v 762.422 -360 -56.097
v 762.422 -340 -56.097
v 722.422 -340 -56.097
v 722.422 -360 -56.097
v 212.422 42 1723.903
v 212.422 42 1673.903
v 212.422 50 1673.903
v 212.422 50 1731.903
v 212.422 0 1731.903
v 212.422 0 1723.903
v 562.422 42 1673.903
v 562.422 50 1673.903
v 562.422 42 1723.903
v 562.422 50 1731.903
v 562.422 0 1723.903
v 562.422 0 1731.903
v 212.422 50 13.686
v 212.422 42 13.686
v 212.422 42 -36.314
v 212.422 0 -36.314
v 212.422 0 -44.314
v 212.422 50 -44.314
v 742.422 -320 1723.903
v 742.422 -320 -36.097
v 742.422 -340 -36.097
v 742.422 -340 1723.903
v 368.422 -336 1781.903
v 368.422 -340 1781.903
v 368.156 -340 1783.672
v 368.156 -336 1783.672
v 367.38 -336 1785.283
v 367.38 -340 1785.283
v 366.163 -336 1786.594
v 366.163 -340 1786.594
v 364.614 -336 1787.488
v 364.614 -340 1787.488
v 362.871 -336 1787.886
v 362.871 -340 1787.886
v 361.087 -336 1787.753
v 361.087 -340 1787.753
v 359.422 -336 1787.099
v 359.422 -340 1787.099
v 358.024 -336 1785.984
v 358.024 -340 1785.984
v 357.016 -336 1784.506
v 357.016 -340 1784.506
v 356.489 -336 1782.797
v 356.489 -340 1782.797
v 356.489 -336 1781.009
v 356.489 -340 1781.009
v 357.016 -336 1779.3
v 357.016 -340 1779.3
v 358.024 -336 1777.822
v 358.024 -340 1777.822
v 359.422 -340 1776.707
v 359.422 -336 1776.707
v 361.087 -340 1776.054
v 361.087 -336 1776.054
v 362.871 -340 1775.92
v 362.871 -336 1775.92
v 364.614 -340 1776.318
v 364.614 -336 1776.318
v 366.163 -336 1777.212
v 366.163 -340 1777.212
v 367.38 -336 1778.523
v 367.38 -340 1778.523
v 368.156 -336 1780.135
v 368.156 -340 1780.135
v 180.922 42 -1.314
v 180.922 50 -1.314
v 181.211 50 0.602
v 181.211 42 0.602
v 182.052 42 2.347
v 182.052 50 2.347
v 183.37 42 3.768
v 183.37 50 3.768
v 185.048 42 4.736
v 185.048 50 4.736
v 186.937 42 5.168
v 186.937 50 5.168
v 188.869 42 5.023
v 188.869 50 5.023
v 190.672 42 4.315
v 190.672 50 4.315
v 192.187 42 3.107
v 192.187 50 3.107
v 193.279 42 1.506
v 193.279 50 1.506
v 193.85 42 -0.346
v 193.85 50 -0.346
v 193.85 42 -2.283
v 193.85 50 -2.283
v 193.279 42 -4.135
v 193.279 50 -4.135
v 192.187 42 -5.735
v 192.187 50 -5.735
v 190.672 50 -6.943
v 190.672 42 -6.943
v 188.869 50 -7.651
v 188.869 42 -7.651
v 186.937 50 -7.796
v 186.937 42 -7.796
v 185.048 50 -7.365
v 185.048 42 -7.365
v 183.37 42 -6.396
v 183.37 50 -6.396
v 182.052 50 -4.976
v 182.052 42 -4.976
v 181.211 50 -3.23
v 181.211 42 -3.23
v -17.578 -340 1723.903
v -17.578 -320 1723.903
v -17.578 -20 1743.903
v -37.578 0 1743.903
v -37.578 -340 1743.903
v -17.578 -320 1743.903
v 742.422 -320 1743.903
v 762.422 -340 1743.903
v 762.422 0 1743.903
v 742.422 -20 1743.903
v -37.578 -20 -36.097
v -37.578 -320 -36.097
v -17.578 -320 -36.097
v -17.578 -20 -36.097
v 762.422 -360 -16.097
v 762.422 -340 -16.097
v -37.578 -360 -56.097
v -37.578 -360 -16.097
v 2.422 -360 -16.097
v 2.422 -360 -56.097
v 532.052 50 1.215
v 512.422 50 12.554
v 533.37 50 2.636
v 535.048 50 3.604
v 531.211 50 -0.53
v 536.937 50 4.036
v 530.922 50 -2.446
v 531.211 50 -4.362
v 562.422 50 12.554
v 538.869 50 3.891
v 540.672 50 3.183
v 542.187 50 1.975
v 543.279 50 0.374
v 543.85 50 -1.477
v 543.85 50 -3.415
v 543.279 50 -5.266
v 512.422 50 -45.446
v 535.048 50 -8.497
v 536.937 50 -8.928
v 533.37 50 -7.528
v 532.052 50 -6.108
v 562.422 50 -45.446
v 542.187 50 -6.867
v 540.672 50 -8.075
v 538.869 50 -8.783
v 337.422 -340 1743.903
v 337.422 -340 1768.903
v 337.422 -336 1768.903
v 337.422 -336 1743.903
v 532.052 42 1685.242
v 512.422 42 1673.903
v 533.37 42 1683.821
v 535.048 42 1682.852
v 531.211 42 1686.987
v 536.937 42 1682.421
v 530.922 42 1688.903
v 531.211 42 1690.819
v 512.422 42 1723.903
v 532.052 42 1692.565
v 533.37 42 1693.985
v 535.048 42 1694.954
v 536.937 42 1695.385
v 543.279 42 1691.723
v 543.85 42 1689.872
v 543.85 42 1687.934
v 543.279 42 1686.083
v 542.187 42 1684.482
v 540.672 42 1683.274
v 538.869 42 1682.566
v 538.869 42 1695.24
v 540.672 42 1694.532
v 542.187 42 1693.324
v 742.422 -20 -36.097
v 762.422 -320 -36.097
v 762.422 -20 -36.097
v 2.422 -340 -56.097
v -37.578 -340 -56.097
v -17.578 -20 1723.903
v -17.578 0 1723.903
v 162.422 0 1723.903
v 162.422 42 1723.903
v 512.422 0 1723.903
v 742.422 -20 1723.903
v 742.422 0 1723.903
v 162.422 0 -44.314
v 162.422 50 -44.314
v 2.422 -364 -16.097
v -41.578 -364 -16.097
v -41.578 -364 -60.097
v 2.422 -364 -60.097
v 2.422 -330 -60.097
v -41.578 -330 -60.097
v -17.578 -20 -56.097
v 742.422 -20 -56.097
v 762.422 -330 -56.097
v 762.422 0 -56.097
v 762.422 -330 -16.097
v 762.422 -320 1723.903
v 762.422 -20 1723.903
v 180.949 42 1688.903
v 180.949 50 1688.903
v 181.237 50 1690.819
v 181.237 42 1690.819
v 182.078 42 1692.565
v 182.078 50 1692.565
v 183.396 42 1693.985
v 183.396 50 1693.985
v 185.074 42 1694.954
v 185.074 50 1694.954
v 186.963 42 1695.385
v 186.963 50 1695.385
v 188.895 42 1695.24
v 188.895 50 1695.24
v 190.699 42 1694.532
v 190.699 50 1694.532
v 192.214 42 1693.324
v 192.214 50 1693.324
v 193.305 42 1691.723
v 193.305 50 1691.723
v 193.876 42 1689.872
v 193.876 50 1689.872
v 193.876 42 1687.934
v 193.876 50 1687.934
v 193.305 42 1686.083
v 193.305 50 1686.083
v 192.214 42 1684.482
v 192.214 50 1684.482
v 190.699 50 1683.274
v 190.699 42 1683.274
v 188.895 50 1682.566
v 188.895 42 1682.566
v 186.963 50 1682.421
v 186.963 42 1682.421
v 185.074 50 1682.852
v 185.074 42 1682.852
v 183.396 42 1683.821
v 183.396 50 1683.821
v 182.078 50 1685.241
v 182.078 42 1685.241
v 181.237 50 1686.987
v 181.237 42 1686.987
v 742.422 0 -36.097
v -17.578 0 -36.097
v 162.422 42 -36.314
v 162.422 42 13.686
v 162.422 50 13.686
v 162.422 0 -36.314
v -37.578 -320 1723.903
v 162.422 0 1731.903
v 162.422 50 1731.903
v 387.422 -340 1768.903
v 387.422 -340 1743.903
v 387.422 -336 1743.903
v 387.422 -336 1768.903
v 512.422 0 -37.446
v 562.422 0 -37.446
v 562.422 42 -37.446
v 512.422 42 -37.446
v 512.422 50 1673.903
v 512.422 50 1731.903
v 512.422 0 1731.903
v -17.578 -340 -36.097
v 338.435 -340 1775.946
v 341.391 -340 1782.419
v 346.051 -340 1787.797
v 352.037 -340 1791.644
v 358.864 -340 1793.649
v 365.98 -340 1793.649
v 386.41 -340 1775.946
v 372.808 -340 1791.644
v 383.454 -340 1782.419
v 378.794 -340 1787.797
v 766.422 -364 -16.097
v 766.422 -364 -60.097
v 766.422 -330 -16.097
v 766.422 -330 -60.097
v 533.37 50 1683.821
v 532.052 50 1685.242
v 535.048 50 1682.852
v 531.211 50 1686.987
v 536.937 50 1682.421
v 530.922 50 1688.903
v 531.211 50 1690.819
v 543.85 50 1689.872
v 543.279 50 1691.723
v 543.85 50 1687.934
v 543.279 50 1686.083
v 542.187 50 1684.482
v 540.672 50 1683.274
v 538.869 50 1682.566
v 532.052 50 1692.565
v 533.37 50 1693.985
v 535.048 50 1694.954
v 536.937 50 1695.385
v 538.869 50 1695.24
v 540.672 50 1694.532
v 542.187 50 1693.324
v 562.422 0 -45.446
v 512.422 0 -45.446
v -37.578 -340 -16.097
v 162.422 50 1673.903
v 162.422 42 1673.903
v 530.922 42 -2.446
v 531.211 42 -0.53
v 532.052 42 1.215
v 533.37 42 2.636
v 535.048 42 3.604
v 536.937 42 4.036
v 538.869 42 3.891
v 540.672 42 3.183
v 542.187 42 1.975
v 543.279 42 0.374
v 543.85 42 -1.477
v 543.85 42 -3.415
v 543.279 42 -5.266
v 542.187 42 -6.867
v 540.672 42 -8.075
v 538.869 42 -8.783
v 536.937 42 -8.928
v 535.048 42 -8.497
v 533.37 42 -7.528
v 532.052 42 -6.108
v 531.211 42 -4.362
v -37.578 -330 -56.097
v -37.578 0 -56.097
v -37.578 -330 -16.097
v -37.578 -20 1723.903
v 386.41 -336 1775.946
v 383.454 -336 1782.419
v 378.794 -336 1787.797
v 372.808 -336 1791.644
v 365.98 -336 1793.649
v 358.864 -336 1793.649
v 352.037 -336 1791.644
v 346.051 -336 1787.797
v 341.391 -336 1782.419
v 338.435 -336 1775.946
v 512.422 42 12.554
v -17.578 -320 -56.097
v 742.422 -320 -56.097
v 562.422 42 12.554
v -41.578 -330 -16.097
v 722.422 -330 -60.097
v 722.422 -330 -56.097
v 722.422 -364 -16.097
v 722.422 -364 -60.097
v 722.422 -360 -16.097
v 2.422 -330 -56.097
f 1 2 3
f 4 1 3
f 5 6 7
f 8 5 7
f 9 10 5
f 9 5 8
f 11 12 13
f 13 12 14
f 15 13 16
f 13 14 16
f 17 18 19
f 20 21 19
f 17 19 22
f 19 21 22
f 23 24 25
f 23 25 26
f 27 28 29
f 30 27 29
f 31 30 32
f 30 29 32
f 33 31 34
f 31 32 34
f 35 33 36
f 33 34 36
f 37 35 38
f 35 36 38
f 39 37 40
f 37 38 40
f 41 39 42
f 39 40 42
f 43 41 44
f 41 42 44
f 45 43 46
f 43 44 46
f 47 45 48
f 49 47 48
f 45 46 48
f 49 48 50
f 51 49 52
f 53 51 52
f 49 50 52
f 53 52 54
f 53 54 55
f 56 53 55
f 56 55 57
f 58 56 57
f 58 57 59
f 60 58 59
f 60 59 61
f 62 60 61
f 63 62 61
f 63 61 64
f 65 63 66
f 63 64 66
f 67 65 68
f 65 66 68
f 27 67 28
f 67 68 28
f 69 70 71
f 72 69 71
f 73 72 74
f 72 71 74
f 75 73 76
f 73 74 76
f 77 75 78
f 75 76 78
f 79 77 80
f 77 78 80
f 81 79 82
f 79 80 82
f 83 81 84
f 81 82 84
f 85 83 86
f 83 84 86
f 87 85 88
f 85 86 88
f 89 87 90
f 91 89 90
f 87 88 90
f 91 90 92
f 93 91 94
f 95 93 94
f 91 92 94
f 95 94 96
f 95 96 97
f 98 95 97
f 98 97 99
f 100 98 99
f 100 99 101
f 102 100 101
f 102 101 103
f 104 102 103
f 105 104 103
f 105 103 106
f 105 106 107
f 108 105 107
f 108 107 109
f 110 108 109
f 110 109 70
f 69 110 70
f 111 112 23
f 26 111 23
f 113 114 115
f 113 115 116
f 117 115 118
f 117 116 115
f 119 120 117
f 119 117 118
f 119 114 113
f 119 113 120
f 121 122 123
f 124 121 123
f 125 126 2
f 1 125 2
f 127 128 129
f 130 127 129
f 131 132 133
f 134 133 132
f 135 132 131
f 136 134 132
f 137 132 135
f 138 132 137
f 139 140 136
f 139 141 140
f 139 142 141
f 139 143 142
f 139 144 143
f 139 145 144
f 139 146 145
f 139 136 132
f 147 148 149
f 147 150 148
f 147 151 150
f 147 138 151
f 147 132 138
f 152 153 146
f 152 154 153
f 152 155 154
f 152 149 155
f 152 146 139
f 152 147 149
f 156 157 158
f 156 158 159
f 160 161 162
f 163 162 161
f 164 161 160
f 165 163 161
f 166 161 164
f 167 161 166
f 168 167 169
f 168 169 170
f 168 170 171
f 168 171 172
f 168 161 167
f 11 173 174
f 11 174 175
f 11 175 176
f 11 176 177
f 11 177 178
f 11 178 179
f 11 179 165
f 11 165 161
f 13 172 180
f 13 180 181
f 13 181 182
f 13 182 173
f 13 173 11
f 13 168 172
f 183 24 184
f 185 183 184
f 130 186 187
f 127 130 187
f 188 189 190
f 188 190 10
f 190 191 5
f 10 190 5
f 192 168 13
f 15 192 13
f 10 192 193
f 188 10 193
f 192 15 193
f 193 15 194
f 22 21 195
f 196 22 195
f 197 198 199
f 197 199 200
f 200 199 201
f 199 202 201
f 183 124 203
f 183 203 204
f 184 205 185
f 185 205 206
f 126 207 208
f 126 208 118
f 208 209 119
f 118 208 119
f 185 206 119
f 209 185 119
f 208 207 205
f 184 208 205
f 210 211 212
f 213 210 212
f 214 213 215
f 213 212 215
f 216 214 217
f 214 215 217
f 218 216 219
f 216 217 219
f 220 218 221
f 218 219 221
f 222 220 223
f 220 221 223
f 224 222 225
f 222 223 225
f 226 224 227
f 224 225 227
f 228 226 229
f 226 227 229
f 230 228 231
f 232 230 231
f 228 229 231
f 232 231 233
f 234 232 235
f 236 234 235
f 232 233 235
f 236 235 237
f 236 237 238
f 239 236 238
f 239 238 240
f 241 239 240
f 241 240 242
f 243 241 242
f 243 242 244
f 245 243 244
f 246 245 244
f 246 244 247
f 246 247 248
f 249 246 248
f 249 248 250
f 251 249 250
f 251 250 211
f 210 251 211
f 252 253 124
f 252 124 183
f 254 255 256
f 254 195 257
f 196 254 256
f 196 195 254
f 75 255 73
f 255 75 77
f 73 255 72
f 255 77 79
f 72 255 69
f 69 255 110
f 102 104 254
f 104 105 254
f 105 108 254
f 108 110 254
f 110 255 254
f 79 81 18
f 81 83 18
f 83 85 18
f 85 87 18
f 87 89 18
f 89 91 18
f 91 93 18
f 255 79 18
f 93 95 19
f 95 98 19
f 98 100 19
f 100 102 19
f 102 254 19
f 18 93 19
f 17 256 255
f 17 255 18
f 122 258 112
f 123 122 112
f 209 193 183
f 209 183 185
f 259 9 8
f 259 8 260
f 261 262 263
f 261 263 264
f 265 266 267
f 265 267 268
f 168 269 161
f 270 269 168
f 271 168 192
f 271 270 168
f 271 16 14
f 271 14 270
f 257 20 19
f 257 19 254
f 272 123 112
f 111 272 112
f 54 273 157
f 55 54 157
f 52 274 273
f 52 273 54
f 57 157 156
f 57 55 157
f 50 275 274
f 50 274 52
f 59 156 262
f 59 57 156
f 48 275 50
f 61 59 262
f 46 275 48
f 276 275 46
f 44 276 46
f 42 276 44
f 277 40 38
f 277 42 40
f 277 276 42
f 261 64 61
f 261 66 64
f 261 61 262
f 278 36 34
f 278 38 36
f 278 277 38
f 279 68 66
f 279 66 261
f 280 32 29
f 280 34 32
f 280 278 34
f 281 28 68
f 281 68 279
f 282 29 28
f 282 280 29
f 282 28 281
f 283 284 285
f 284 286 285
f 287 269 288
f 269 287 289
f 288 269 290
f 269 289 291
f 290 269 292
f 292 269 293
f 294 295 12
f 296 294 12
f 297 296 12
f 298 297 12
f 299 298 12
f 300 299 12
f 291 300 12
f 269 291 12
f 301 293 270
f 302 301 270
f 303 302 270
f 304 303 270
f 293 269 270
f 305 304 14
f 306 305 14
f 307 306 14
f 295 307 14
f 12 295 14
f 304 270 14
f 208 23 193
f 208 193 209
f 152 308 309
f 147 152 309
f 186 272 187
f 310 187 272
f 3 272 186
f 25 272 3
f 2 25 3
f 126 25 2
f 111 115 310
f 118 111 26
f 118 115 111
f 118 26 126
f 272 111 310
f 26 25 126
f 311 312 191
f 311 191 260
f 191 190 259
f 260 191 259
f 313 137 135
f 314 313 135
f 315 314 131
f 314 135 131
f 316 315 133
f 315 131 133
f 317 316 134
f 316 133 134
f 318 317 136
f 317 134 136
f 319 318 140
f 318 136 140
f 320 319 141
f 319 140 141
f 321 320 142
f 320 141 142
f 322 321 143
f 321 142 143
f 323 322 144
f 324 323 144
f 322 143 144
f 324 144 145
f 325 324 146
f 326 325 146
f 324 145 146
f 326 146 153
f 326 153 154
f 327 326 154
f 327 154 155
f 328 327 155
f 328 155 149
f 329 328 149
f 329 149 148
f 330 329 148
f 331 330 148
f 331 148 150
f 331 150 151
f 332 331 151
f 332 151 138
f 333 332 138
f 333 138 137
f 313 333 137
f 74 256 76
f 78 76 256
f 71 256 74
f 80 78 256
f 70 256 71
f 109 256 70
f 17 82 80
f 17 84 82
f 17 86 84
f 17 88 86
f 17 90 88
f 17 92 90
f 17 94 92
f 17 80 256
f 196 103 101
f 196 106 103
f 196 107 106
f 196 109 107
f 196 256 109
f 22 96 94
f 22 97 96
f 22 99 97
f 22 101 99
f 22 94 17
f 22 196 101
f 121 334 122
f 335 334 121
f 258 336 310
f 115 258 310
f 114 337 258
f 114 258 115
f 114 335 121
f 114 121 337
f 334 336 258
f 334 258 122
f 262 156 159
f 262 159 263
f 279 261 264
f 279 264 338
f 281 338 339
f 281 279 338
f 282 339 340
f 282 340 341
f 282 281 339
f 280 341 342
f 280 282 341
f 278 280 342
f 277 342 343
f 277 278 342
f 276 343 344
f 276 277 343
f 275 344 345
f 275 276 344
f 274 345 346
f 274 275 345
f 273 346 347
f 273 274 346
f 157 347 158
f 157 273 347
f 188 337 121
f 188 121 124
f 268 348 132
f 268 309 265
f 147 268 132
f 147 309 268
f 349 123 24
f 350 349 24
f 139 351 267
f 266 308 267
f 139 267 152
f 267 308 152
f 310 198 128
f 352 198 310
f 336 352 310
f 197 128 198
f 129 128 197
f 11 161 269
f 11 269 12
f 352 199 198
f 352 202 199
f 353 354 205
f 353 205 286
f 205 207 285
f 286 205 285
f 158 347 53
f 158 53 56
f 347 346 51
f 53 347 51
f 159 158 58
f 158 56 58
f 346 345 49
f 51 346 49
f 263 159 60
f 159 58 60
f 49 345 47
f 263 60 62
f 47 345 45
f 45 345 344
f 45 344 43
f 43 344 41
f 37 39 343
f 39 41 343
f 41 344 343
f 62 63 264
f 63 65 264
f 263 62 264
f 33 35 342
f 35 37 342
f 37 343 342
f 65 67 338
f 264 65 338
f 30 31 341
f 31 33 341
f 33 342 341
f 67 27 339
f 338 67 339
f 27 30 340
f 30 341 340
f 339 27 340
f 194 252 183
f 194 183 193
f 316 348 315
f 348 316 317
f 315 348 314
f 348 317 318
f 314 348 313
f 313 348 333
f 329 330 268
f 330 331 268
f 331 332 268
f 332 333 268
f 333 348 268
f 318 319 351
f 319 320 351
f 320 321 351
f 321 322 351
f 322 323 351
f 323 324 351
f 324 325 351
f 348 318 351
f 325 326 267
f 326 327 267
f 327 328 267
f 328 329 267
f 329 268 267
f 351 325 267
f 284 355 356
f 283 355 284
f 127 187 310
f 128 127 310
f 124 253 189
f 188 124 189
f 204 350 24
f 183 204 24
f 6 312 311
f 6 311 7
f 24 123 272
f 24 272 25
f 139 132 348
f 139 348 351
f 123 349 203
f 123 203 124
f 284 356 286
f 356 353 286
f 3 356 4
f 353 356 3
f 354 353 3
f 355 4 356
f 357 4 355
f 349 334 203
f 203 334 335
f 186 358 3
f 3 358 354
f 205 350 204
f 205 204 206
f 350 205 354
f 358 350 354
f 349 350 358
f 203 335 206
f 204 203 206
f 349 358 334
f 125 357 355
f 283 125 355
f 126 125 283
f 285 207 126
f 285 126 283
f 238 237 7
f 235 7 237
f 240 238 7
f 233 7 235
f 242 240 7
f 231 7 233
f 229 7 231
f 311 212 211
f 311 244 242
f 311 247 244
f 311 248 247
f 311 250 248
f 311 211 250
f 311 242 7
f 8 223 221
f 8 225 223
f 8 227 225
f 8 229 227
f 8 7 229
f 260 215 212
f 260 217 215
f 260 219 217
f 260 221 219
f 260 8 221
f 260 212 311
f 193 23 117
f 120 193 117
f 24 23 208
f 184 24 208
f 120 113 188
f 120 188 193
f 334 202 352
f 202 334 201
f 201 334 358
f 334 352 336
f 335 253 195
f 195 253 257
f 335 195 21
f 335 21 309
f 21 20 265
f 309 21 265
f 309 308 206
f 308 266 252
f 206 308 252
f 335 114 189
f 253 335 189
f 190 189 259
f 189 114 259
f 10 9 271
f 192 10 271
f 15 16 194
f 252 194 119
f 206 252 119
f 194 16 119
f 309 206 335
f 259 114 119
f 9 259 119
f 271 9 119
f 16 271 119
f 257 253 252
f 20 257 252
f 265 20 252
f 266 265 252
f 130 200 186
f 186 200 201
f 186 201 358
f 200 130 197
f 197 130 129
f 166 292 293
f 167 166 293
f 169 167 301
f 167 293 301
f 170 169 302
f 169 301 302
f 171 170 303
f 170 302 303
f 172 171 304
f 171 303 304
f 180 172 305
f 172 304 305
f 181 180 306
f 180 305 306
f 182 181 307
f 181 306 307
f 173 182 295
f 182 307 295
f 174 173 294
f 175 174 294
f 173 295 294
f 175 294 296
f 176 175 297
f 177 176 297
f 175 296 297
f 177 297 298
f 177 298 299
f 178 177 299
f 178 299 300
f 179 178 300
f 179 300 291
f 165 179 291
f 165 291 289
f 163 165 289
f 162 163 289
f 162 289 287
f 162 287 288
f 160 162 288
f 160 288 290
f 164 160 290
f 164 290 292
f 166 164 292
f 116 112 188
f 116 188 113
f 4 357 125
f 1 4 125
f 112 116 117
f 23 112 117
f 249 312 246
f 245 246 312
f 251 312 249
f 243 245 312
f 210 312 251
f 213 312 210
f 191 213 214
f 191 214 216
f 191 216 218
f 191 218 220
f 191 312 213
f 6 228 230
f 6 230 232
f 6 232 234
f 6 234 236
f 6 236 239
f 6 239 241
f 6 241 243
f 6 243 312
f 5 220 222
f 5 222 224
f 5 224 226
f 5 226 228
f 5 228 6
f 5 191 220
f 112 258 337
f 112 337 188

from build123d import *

# Parameters (mm, degrees)
F0_W      = 800
F0_H      = 1800
F0_W_2    = 760
F0_H_2    = 1760
F1_DEPTH  = 20
F2_W      = 20
F2_H      = 20
F3_DEPTH  = 300
F4_W      = 800
F4_H      = 1800
F4_W_2    = 760
F4_H_2    = 1760
F5_DEPTH  = 20
F6_W      = 50
F6_H      = 8
F7_DEPTH  = 50
F8_W      = 50
F8_H      = 8
F9_DEPTH  = 50
F10_W     = 50
F10_H     = 8
F11_DEPTH = 50
F12_W     = 50
F12_H     = 8
F13_DEPTH = 50
F14_R     = 6.5
F15_DEPTH = 25
F16_R     = 6.5
F17_DEPTH = 25
F18_R     = 6.5
F19_DEPTH = 25
F20_R     = 6.5
F21_DEPTH = 25
F22_R     = 6
F23_DEPTH = 4
F25_DEPTH = 10
F26_DEPTH = 20
F27_W     = 44
F27_H     = 44
F28_DEPTH = 4
F30_DEPTH = 10
F31_DEPTH = 20
F32_W     = 44
F32_H     = 44
F33_DEPTH = 4


with BuildPart() as f1:
    # F0 (on Front) → F1 (new body)
    with BuildSketch(Plane.XZ):
        with Locations((362.4222703278, 843.9030997455)):
            Rectangle(F0_W, F0_H)
        with Locations((362.4222703278, 843.9030997455)):
            Rectangle(F0_W_2, F0_H_2, mode=Mode.SUBTRACT)
    extrude(amount=F1_DEPTH)

    # F2 (on face) → F3 (join)
    with BuildSketch(Plane.XZ.offset(20)):
        with Locations((752.4222703278, 1733.9030997455)):
            Rectangle(F2_W, F2_H)
        with Locations((752.4222703278, -46.0969002545)):
            Rectangle(F2_W, F2_H)
        with Locations((-27.5777296722, -46.0969002545)):
            Rectangle(F2_W, F2_H)
        with Locations((-27.5777296722, 1733.9030997455)):
            Rectangle(F2_W, F2_H)
    extrude(amount=F3_DEPTH)

    # F4 (on face) → F5 (join)
    with BuildSketch(Plane.XZ.offset(320)):
        with Locations((362.4222703278, 843.9030997455)):
            Rectangle(F4_W, F4_H)
        with Locations((362.4222703278, 843.9030997455)):
            Rectangle(F4_W_2, F4_H_2, mode=Mode.SUBTRACT)
    extrude(amount=F5_DEPTH)

    # F6 (on face) → F7 (join)
    with BuildSketch(Plane(origin=(0, 0, 0), x_dir=(-1, 0, 0), z_dir=(0, 1, 0))):
        with Locations((-537.4222703278, 1727.9030997455)):
            Rectangle(F6_W, F6_H)
        with Locations((-187.4222703278, 1727.9030997455)):
            Rectangle(F6_W, F6_H)
        with Locations((-537.4222703278, -41.4462356865)):
            Rectangle(F6_W, F6_H)
        with Locations((-187.4222703278, -40.3143025041)):
            Rectangle(F6_W, F6_H)
    extrude(amount=F7_DEPTH)

    # F8 (on face) → F9 (join)
    with BuildSketch(Plane(origin=(0, 0, 1723.9030997455), x_dir=(1, 0, 0), z_dir=(0, 0, -1))):
        with Locations((537.4222703278, -46)):
            Rectangle(F8_W, F8_H)
        with Locations((187.4222703278, -46)):
            Rectangle(F8_W, F8_H)
    extrude(amount=F9_DEPTH)

    # F10 (on face) → F11 (join)
    with BuildSketch(Plane.XY.offset(-36.3143025041)):
        with Locations((187.4222703278, 46)):
            Rectangle(F10_W, F10_H)
    extrude(amount=F11_DEPTH)

    # F12 (on face) → F13 (join)
    with BuildSketch(Plane.XY.offset(-37.4462356865)):
        with Locations((537.4222703278, 46)):
            Rectangle(F12_W, F12_H)
    extrude(amount=F13_DEPTH)

    # F14 (on face) → F15 (cut)
    with BuildSketch(Plane(origin=(0, 50, 0), x_dir=(-1, 0, 0), z_dir=(0, 1, 0))):
        with Locations((-187.4222703278, -1.3143025041)):
            Circle(F14_R)
    extrude(amount=-F15_DEPTH, mode=Mode.SUBTRACT)

    # F16 (on face) → F17 (cut)
    with BuildSketch(Plane(origin=(0, 50, 0), x_dir=(-1, 0, 0), z_dir=(0, 1, 0))):
        with Locations((-537.4222703278, -2.4462356865)):
            Circle(F16_R)
    extrude(amount=-F17_DEPTH, mode=Mode.SUBTRACT)

    # F18 (on face) → F19 (cut)
    with BuildSketch(Plane(origin=(0, 50, 0), x_dir=(-1, 0, 0), z_dir=(0, 1, 0))):
        with Locations((-187.4486728463, 1688.9030765091)):
            Circle(F18_R)
    extrude(amount=-F19_DEPTH, mode=Mode.SUBTRACT)

    # F20 (on face) → F21 (cut)
    with BuildSketch(Plane(origin=(0, 50, 0), x_dir=(-1, 0, 0), z_dir=(0, 1, 0))):
        with Locations((-537.4222703278, 1688.9030997455)):
            Circle(F20_R)
    extrude(amount=-F21_DEPTH, mode=Mode.SUBTRACT)

    # F24 (on face) → F25 (join)
    with BuildSketch(Plane.XZ.offset(340)):
        Polygon((2.4222703278, -56.0969002545), (-37.5777296722, -56.0969002545), (-37.5777296722, -16.0969002545), (-41.5777296722, -16.0969002545), (-41.5777296722, -60.0969002545), (2.4222703278, -60.0969002545), align=None)
    extrude(amount=-F25_DEPTH)

    # F24 (on face) → F26 (join)
    with BuildSketch(Plane.XZ.offset(340)):
        Polygon((2.4222703278, -56.0969002545), (-37.5777296722, -56.0969002545), (-37.5777296722, -16.0969002545), (-41.5777296722, -16.0969002545), (-41.5777296722, -60.0969002545), (2.4222703278, -60.0969002545), align=None)
    extrude(amount=F26_DEPTH)

    # F27 (on face) → F28 (join)
    with BuildSketch(Plane.XZ.offset(360)):
        with Locations((-19.5777296722, -38.0969002545)):
            Rectangle(F27_W, F27_H)
    extrude(amount=F28_DEPTH)

    # F29 (on face) → F30 (join)
    with BuildSketch(Plane.XZ.offset(340)):
        Polygon((762.4222703278, -16.0969002545), (762.4222703278, -56.0969002545), (722.4222703278, -56.0969002545), (722.4222703278, -60.0969002545), (766.4222703278, -60.0969002545), (766.4222703278, -16.0969002545), align=None)
    extrude(amount=-F30_DEPTH)

    # F29 (on face) → F31 (join)
    with BuildSketch(Plane.XZ.offset(340)):
        Polygon((762.4222703278, -16.0969002545), (762.4222703278, -56.0969002545), (722.4222703278, -56.0969002545), (722.4222703278, -60.0969002545), (766.4222703278, -60.0969002545), (766.4222703278, -16.0969002545), align=None)
    extrude(amount=F31_DEPTH)

    # F32 (on face) → F33 (join)
    with BuildSketch(Plane.XZ.offset(360)):
        with Locations((744.4222703278, -38.0969002545)):
            Rectangle(F32_W, F32_H)
    extrude(amount=F33_DEPTH)


with BuildPart() as f23:
    # F22 (on face) → F23 (new body)
    with BuildSketch(Plane.XZ.offset(340)):
        with BuildLine():
            Line((337.4222703278, 1743.9030997455), (362.4222703278, 1743.9030997455))
            Line((362.4222703278, 1743.9030997455), (387.4222703278, 1743.9030997455))
            Line((387.4222703278, 1743.9030997455), (387.4222703278, 1768.9030997455))
            ThreePointArc((387.4222703278, 1768.9030997455), (362.4222703278, 1793.9030997455), (337.4222703278, 1768.9030997455))
            Line((337.4222703278, 1768.9030997455), (337.4222703278, 1743.9030997455))
        make_face()
        with Locations((362.4222703278, 1781.9030997455)):
            Circle(F22_R, mode=Mode.SUBTRACT)
    extrude(amount=-F23_DEPTH)


solid = Compound([f1.part, f23.part])
